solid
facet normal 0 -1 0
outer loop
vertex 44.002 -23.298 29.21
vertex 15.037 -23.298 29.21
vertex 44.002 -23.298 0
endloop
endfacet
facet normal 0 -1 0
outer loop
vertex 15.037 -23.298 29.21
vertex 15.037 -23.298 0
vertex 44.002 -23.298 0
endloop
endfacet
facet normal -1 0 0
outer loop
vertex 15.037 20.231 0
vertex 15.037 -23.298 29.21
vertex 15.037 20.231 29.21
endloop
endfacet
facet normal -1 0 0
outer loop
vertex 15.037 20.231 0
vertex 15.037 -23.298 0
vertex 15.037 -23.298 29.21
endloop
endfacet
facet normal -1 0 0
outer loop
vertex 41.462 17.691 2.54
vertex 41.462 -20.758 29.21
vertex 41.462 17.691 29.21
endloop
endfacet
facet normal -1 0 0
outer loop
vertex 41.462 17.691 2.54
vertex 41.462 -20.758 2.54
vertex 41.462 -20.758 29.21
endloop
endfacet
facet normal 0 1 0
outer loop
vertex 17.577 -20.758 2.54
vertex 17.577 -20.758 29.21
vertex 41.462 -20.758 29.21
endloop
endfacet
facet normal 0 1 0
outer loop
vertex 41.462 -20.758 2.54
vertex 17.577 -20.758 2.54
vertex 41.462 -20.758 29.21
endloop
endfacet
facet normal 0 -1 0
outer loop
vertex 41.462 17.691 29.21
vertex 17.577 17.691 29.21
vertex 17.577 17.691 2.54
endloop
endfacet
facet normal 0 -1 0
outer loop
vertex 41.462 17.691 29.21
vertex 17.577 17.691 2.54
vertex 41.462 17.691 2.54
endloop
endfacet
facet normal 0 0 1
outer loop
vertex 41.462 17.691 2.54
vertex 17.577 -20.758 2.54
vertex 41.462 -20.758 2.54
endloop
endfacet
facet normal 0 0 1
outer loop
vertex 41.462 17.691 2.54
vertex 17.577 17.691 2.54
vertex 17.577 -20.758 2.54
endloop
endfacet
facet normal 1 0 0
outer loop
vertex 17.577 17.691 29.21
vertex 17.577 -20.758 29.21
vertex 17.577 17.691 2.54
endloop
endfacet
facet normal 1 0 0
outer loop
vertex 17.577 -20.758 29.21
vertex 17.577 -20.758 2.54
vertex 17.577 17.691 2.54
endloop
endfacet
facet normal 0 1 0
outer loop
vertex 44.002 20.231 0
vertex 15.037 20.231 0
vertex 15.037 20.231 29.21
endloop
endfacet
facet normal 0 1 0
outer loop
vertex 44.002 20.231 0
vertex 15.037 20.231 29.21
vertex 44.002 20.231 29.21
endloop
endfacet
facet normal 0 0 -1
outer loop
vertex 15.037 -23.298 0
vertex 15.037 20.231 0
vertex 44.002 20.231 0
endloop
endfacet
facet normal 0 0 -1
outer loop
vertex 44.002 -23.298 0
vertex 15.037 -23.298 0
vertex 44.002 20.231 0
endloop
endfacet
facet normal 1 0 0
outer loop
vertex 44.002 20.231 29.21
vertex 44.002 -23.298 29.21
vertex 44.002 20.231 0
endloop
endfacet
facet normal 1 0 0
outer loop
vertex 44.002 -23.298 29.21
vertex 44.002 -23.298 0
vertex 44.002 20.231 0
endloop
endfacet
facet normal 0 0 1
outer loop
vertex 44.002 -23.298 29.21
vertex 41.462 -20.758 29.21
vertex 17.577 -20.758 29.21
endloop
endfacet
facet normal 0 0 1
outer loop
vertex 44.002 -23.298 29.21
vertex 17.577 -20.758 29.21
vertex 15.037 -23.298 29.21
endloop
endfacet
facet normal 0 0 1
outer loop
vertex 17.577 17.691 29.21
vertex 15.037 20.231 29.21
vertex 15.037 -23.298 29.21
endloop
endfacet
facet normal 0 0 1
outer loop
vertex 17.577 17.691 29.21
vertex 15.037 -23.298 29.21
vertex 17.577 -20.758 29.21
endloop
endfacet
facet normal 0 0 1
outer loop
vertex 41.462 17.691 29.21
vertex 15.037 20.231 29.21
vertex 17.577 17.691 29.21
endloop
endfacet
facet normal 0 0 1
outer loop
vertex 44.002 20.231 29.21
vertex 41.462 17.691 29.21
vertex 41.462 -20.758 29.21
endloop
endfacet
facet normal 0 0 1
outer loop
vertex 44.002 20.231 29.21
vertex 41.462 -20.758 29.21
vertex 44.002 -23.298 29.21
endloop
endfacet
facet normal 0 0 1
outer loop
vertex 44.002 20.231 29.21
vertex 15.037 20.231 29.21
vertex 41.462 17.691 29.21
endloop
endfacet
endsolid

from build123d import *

# Parameters (mm, degrees)
F1_W     = 28.9652645588
F1_H     = 43.5288026929
F2_DEPTH = 3.81
F3_DEPTH = 25.4
F4_T     = -2.54


# Not quite as in the source:
# - a feature of the source that left no trace in its solid (it failed there, or was rolled back) is left out


with BuildPart() as f2:
    # F1 (on Top) → F2 (new body)
    with BuildSketch(Plane.XY):
        with Locations((29.5196138322, -1.5338174999)):
            Rectangle(F1_W, F1_H)
    extrude(amount=F2_DEPTH)

    # F3 (add): a face of the model
    f3_faces = [f2.faces().sort_by_distance(p)[0] for p in [
        (29.5196138322, -1.5338174999, 3.81),
    ]]
    extrude(f3_faces, amount=F3_DEPTH)

    # F4
    f4_openings = [f2.faces().sort_by_distance(p)[0] for p in [
        (29.519614, -1.533817, 29.21),
    ]]
    offset(amount=F4_T, openings=f4_openings)


solid = f2.part
